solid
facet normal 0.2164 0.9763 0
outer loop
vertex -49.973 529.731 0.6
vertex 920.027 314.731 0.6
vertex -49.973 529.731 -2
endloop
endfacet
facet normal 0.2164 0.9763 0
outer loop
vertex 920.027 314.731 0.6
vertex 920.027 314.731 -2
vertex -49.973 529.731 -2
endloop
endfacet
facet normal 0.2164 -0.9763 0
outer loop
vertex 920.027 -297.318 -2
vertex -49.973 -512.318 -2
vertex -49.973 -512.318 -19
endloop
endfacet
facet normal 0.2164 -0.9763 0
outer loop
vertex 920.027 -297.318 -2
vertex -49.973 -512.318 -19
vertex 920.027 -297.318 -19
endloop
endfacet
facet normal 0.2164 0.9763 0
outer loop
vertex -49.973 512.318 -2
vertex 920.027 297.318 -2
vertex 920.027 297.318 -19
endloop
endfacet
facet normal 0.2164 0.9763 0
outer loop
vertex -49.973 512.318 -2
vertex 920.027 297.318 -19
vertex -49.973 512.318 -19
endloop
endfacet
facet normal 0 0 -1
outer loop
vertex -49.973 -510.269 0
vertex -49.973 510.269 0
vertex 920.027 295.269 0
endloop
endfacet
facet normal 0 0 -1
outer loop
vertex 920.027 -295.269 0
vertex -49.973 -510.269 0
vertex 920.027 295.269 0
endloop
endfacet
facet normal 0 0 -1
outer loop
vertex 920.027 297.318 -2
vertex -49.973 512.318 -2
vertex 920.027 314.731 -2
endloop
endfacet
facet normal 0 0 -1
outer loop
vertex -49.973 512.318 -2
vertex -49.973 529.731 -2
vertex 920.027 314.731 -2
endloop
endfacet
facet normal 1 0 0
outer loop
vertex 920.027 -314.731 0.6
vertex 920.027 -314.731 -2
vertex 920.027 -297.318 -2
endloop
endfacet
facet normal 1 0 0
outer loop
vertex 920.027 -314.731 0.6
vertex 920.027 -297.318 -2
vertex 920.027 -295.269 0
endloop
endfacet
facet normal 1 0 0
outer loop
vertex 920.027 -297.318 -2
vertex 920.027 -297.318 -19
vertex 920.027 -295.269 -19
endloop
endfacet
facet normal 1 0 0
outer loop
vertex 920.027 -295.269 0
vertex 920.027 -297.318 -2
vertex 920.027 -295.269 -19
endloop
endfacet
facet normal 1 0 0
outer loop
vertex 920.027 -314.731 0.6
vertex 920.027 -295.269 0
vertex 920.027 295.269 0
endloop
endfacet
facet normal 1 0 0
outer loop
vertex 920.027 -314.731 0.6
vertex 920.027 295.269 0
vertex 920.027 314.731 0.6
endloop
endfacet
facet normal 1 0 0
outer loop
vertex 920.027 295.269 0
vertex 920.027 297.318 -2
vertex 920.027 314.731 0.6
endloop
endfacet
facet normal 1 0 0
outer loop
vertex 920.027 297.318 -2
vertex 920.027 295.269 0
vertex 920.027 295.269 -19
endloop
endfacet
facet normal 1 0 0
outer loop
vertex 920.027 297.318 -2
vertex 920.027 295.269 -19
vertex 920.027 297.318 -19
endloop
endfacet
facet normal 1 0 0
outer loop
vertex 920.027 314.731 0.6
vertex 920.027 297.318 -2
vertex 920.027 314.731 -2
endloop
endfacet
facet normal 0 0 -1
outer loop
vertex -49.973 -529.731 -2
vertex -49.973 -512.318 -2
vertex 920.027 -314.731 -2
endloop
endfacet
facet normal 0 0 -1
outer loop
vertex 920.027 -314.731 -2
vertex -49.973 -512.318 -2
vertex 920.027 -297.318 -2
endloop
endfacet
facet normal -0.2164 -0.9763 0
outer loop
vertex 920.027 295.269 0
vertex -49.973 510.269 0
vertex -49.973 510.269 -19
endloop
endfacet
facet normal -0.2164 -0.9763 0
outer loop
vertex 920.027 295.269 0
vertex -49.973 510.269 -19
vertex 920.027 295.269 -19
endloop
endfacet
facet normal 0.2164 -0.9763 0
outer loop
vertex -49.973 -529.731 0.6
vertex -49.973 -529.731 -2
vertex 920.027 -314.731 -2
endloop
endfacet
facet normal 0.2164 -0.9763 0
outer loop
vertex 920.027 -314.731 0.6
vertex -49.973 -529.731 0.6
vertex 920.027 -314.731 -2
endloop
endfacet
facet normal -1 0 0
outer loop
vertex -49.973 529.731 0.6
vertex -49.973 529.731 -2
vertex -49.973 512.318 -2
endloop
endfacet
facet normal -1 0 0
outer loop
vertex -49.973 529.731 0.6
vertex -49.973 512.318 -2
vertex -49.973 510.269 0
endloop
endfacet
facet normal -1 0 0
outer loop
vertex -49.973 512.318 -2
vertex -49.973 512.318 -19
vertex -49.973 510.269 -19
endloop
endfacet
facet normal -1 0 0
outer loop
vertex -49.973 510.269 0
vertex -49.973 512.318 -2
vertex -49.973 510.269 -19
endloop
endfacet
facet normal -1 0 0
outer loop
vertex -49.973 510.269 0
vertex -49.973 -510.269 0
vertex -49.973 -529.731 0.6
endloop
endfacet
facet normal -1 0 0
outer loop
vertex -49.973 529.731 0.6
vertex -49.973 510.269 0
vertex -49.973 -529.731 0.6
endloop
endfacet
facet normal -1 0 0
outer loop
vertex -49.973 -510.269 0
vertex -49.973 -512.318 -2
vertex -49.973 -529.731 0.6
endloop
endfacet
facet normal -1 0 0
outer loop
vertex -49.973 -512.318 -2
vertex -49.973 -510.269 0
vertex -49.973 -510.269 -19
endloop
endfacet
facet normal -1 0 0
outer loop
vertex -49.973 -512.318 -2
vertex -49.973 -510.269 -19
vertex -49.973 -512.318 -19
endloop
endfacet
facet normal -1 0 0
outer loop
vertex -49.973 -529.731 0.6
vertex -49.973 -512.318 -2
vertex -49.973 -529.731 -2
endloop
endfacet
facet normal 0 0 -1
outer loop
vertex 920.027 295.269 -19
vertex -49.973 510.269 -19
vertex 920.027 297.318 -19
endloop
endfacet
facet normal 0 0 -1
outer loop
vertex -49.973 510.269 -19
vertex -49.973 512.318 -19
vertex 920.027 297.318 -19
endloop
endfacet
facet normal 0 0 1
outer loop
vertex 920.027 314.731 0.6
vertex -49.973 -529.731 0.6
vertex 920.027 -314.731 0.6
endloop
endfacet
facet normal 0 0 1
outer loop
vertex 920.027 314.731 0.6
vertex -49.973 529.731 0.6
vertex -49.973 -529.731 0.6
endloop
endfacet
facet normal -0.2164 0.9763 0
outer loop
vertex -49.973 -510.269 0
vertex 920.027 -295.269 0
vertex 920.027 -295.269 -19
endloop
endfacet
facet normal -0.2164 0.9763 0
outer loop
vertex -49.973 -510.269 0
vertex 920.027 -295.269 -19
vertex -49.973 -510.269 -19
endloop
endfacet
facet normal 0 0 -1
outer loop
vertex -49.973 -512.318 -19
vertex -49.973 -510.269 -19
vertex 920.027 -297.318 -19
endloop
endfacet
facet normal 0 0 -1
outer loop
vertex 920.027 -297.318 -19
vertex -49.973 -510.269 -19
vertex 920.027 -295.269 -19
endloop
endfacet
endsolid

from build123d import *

# Parameters (mm, degrees)
F1_DEPTH = 19
F2_DEPTH = 2
F3_DEPTH = 0.6


with BuildPart() as f1:
    # F0 (on Top) → F1 (new body)
    with BuildSketch(Plane.XY):
        Polygon((920.027071, -297.317977), (920.027071, -295.269437), (-49.972929, -510.269437), (-49.972929, -512.317977), align=None)
        Polygon((-49.972929, 510.269437), (920.027071, 295.269437), (920.027071, 297.317977), (-49.972929, 512.317977), align=None)
    extrude(amount=-F1_DEPTH)

    # F0 (on Top) → F2 (join)
    with BuildSketch(Plane.XY):
        Polygon((-49.972929, 512.317977), (920.027071, 297.317977), (920.027071, 305), (920.027071, 314.730563), (-49.972929, 529.730563), (-49.972929, 520), align=None)
        Polygon((920.027071, -305), (920.027071, -297.317977), (-49.972929, -512.317977), (-49.972929, -520), (-49.972929, -529.730563), (920.027071, -314.730563), align=None)
    extrude(amount=-F2_DEPTH)

    # F0 (on Top) → F3 (join)
    with BuildSketch(Plane.XY):
        Polygon((920.027071, -295.269437), (920.027071, 0), (920.027071, 295.269437), (-49.972929, 510.269437), (-49.972929, 0), (-49.972929, -510.269437), align=None)
        Polygon((920.027071, -297.317977), (920.027071, -295.269437), (-49.972929, -510.269437), (-49.972929, -512.317977), align=None)
        Polygon((920.027071, -305), (920.027071, -297.317977), (-49.972929, -512.317977), (-49.972929, -520), (-49.972929, -529.730563), (920.027071, -314.730563), align=None)
        Polygon((-49.972929, 510.269437), (920.027071, 295.269437), (920.027071, 297.317977), (-49.972929, 512.317977), align=None)
        Polygon((-49.972929, 512.317977), (920.027071, 297.317977), (920.027071, 305), (920.027071, 314.730563), (-49.972929, 529.730563), (-49.972929, 520), align=None)
    extrude(amount=F3_DEPTH)


solid = f1.part
